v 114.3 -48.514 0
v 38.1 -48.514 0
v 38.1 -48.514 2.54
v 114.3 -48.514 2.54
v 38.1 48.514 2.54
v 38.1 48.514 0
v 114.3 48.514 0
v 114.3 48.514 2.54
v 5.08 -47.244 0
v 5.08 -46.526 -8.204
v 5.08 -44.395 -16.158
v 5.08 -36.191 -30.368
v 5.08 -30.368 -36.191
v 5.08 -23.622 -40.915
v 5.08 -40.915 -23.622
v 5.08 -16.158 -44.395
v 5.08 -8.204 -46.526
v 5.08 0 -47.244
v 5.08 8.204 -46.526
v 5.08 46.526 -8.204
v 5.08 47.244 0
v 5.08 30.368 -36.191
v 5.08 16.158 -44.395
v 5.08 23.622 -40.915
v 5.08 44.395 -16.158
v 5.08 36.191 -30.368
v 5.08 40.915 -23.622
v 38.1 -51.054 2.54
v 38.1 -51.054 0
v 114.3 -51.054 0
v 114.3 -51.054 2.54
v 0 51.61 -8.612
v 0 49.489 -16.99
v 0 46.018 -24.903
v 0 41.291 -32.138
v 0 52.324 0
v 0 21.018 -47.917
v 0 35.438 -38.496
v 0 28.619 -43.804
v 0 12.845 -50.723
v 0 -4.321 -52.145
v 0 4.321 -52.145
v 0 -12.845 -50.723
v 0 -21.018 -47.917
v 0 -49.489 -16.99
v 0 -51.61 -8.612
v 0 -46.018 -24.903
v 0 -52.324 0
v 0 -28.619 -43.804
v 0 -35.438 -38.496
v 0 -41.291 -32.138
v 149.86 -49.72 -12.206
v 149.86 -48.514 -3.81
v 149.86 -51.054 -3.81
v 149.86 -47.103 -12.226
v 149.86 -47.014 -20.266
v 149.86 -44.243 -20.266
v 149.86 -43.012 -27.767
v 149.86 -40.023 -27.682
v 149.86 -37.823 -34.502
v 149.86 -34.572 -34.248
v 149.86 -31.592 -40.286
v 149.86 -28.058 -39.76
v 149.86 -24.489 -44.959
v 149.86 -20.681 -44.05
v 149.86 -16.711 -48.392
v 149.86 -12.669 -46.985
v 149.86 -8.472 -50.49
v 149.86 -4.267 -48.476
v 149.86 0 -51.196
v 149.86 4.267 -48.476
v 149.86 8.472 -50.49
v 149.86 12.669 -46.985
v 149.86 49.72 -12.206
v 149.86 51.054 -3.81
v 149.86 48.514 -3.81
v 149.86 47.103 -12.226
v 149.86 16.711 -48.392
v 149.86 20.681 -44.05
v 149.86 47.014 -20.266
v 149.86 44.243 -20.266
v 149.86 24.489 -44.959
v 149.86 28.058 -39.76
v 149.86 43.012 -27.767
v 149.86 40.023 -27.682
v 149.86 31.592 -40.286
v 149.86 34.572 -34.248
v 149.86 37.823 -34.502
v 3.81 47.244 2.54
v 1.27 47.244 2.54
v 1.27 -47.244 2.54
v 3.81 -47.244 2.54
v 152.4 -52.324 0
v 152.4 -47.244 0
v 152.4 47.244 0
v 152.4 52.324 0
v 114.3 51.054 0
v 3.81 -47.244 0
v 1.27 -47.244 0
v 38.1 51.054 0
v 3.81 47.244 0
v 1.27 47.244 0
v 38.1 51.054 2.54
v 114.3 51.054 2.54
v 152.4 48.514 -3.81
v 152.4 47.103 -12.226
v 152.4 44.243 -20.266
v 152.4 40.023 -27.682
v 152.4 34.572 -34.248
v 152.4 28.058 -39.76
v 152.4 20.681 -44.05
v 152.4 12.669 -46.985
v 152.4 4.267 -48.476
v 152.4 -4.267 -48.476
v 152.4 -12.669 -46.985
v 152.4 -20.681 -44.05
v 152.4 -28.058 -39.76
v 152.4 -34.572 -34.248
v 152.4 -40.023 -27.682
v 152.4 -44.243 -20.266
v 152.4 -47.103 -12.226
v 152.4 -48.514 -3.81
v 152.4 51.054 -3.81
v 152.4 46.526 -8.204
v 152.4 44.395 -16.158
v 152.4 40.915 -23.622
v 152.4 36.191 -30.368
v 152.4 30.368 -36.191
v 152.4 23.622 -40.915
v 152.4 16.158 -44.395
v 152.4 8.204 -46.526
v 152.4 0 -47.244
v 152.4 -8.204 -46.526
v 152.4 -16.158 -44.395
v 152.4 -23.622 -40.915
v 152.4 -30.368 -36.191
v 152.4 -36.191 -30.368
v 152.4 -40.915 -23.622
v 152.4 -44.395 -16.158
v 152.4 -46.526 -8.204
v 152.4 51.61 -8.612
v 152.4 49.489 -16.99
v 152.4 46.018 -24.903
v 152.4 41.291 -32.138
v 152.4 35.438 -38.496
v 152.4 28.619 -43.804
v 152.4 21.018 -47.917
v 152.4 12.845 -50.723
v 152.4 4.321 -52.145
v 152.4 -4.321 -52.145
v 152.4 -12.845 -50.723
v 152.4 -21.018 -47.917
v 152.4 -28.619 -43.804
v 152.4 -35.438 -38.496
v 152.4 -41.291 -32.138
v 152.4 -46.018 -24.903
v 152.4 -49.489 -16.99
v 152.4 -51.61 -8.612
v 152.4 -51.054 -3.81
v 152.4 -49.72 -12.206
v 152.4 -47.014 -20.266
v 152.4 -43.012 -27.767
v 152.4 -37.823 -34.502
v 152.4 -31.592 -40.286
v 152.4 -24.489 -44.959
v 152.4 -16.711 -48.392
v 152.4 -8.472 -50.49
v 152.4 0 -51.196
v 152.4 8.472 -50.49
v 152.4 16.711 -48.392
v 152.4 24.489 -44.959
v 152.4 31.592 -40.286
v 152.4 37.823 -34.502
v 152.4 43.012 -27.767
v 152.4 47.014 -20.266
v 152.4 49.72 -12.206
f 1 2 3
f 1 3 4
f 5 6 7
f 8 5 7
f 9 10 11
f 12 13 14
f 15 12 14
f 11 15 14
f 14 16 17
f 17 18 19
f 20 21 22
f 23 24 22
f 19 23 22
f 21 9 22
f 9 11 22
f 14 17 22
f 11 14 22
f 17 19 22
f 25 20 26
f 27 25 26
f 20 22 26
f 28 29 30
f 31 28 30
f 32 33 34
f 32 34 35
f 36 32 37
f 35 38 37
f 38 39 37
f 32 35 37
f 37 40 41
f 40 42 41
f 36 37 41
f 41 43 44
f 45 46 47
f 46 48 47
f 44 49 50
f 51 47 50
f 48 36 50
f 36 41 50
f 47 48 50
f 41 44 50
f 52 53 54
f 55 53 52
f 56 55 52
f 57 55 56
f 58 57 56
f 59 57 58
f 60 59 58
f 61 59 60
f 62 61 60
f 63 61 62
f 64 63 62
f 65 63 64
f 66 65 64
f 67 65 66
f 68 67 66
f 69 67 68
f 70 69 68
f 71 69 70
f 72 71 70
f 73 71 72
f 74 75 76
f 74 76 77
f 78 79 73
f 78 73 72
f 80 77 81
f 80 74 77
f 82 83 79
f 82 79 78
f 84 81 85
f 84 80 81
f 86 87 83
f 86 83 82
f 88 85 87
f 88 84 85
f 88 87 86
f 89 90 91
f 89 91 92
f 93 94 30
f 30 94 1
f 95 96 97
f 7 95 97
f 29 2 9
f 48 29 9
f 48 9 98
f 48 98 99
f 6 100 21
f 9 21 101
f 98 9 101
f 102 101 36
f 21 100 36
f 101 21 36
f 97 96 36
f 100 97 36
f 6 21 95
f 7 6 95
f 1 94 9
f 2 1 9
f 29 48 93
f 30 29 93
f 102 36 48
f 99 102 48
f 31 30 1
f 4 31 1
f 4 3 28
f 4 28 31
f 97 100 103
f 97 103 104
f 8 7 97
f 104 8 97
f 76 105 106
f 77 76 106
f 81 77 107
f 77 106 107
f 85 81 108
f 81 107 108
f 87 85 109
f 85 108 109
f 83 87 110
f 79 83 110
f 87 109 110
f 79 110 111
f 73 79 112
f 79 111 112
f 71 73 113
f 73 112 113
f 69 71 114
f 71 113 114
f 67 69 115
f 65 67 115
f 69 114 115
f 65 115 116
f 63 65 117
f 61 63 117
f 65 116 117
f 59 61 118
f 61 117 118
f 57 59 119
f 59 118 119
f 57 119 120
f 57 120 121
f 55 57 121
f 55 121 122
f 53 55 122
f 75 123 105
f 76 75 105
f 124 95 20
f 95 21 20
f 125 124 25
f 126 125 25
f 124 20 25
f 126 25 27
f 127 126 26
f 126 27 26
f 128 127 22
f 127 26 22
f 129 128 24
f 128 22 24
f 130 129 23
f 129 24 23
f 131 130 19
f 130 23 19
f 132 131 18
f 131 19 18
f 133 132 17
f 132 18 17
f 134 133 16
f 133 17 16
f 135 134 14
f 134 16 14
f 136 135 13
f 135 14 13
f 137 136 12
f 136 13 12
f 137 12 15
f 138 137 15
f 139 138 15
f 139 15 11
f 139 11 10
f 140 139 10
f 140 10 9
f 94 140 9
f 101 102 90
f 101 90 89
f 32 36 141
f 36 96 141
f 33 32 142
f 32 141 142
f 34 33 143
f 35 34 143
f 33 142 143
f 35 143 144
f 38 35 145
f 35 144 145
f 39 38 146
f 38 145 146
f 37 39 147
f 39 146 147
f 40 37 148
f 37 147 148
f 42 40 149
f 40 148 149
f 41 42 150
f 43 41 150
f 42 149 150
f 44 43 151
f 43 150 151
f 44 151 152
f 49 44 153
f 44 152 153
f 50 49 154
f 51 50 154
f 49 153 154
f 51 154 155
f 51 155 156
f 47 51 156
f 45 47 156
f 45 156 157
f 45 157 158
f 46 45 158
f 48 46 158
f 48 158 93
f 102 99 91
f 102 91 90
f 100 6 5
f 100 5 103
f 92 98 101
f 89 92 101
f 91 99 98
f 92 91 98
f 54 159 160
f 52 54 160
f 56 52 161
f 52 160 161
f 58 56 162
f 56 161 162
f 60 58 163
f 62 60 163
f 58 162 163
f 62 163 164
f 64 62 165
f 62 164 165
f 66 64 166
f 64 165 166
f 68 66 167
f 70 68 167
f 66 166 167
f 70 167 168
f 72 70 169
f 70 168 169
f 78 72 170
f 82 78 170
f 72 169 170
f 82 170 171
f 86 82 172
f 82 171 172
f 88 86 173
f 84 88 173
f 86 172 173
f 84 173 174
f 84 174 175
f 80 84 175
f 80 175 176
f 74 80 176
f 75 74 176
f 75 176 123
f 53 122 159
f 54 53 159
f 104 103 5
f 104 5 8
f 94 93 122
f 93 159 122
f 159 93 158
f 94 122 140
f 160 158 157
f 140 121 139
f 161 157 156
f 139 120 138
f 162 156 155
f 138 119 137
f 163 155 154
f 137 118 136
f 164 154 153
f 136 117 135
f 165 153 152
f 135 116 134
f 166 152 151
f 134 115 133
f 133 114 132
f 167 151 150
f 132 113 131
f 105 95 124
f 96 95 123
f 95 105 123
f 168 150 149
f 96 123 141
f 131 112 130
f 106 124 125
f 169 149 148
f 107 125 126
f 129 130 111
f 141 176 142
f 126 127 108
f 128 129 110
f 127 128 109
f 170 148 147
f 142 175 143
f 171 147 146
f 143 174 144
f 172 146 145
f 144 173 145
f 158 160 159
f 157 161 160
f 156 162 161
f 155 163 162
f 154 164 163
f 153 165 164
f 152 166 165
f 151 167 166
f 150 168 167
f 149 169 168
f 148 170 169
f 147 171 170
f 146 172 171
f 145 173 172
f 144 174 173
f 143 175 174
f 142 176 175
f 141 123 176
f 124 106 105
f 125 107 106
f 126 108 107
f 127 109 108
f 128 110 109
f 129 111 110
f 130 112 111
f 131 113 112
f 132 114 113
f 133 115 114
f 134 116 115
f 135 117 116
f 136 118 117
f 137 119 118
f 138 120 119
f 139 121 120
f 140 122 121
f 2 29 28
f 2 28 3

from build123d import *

# Parameters (mm, degrees)
REVOLVE1_ANGLE      = 180
SKETCH4_W           = 2.54
SKETCH4_H           = 94.488
SKETCH4_W_2         = 76.2
SKETCH4_H_2         = 2.54
BOSS_EXTRUDE1_DEPTH = 2.54
CUT_EXTRUDE1_DEPTH  = 2.54


with BuildPart() as part:
    # Sketch1 → Revolve1 (revolve)
    with BuildSketch(Plane.XY):
        Polygon((0, 0), (0, 52.324), (152.4, 52.324), (152.4, 47.244), (5.08, 47.244), (5.08, 0), align=None)
    revolve(axis=Axis((5.08, 0, 0), (-1, 0, 0)), revolution_arc=REVOLVE1_ANGLE)

    # Sketch4 → Boss-Extrude1 (add)
    with BuildSketch(Plane.XY):
        with Locations((2.54, 0)):
            Rectangle(SKETCH4_W, SKETCH4_H)
        with Locations((76.2, 49.784)):
            Rectangle(SKETCH4_W_2, SKETCH4_H_2)
        with Locations((76.2, -49.784)):
            Rectangle(SKETCH4_W_2, SKETCH4_H_2)
    extrude(amount=BOSS_EXTRUDE1_DEPTH)

    # Sketch5 → Cut-Extrude1 (cut)
    with BuildSketch(Plane(origin=(152.4, 0, 0), x_dir=(0, 0, -1), z_dir=(1, 0, 0))):
        with BuildLine():
            Line((3.81, 51.054), (3.81, 48.514))
            ThreePointArc((3.81, 48.514), (48.663377359, 0), (3.81, -48.514))
            Line((3.81, -48.514), (3.81, -51.054))
            ThreePointArc((3.81, -51.054), (51.195966794, 0), (3.81, 51.054))
        make_face()
    extrude(amount=-CUT_EXTRUDE1_DEPTH, mode=Mode.SUBTRACT)


solid = part.part
